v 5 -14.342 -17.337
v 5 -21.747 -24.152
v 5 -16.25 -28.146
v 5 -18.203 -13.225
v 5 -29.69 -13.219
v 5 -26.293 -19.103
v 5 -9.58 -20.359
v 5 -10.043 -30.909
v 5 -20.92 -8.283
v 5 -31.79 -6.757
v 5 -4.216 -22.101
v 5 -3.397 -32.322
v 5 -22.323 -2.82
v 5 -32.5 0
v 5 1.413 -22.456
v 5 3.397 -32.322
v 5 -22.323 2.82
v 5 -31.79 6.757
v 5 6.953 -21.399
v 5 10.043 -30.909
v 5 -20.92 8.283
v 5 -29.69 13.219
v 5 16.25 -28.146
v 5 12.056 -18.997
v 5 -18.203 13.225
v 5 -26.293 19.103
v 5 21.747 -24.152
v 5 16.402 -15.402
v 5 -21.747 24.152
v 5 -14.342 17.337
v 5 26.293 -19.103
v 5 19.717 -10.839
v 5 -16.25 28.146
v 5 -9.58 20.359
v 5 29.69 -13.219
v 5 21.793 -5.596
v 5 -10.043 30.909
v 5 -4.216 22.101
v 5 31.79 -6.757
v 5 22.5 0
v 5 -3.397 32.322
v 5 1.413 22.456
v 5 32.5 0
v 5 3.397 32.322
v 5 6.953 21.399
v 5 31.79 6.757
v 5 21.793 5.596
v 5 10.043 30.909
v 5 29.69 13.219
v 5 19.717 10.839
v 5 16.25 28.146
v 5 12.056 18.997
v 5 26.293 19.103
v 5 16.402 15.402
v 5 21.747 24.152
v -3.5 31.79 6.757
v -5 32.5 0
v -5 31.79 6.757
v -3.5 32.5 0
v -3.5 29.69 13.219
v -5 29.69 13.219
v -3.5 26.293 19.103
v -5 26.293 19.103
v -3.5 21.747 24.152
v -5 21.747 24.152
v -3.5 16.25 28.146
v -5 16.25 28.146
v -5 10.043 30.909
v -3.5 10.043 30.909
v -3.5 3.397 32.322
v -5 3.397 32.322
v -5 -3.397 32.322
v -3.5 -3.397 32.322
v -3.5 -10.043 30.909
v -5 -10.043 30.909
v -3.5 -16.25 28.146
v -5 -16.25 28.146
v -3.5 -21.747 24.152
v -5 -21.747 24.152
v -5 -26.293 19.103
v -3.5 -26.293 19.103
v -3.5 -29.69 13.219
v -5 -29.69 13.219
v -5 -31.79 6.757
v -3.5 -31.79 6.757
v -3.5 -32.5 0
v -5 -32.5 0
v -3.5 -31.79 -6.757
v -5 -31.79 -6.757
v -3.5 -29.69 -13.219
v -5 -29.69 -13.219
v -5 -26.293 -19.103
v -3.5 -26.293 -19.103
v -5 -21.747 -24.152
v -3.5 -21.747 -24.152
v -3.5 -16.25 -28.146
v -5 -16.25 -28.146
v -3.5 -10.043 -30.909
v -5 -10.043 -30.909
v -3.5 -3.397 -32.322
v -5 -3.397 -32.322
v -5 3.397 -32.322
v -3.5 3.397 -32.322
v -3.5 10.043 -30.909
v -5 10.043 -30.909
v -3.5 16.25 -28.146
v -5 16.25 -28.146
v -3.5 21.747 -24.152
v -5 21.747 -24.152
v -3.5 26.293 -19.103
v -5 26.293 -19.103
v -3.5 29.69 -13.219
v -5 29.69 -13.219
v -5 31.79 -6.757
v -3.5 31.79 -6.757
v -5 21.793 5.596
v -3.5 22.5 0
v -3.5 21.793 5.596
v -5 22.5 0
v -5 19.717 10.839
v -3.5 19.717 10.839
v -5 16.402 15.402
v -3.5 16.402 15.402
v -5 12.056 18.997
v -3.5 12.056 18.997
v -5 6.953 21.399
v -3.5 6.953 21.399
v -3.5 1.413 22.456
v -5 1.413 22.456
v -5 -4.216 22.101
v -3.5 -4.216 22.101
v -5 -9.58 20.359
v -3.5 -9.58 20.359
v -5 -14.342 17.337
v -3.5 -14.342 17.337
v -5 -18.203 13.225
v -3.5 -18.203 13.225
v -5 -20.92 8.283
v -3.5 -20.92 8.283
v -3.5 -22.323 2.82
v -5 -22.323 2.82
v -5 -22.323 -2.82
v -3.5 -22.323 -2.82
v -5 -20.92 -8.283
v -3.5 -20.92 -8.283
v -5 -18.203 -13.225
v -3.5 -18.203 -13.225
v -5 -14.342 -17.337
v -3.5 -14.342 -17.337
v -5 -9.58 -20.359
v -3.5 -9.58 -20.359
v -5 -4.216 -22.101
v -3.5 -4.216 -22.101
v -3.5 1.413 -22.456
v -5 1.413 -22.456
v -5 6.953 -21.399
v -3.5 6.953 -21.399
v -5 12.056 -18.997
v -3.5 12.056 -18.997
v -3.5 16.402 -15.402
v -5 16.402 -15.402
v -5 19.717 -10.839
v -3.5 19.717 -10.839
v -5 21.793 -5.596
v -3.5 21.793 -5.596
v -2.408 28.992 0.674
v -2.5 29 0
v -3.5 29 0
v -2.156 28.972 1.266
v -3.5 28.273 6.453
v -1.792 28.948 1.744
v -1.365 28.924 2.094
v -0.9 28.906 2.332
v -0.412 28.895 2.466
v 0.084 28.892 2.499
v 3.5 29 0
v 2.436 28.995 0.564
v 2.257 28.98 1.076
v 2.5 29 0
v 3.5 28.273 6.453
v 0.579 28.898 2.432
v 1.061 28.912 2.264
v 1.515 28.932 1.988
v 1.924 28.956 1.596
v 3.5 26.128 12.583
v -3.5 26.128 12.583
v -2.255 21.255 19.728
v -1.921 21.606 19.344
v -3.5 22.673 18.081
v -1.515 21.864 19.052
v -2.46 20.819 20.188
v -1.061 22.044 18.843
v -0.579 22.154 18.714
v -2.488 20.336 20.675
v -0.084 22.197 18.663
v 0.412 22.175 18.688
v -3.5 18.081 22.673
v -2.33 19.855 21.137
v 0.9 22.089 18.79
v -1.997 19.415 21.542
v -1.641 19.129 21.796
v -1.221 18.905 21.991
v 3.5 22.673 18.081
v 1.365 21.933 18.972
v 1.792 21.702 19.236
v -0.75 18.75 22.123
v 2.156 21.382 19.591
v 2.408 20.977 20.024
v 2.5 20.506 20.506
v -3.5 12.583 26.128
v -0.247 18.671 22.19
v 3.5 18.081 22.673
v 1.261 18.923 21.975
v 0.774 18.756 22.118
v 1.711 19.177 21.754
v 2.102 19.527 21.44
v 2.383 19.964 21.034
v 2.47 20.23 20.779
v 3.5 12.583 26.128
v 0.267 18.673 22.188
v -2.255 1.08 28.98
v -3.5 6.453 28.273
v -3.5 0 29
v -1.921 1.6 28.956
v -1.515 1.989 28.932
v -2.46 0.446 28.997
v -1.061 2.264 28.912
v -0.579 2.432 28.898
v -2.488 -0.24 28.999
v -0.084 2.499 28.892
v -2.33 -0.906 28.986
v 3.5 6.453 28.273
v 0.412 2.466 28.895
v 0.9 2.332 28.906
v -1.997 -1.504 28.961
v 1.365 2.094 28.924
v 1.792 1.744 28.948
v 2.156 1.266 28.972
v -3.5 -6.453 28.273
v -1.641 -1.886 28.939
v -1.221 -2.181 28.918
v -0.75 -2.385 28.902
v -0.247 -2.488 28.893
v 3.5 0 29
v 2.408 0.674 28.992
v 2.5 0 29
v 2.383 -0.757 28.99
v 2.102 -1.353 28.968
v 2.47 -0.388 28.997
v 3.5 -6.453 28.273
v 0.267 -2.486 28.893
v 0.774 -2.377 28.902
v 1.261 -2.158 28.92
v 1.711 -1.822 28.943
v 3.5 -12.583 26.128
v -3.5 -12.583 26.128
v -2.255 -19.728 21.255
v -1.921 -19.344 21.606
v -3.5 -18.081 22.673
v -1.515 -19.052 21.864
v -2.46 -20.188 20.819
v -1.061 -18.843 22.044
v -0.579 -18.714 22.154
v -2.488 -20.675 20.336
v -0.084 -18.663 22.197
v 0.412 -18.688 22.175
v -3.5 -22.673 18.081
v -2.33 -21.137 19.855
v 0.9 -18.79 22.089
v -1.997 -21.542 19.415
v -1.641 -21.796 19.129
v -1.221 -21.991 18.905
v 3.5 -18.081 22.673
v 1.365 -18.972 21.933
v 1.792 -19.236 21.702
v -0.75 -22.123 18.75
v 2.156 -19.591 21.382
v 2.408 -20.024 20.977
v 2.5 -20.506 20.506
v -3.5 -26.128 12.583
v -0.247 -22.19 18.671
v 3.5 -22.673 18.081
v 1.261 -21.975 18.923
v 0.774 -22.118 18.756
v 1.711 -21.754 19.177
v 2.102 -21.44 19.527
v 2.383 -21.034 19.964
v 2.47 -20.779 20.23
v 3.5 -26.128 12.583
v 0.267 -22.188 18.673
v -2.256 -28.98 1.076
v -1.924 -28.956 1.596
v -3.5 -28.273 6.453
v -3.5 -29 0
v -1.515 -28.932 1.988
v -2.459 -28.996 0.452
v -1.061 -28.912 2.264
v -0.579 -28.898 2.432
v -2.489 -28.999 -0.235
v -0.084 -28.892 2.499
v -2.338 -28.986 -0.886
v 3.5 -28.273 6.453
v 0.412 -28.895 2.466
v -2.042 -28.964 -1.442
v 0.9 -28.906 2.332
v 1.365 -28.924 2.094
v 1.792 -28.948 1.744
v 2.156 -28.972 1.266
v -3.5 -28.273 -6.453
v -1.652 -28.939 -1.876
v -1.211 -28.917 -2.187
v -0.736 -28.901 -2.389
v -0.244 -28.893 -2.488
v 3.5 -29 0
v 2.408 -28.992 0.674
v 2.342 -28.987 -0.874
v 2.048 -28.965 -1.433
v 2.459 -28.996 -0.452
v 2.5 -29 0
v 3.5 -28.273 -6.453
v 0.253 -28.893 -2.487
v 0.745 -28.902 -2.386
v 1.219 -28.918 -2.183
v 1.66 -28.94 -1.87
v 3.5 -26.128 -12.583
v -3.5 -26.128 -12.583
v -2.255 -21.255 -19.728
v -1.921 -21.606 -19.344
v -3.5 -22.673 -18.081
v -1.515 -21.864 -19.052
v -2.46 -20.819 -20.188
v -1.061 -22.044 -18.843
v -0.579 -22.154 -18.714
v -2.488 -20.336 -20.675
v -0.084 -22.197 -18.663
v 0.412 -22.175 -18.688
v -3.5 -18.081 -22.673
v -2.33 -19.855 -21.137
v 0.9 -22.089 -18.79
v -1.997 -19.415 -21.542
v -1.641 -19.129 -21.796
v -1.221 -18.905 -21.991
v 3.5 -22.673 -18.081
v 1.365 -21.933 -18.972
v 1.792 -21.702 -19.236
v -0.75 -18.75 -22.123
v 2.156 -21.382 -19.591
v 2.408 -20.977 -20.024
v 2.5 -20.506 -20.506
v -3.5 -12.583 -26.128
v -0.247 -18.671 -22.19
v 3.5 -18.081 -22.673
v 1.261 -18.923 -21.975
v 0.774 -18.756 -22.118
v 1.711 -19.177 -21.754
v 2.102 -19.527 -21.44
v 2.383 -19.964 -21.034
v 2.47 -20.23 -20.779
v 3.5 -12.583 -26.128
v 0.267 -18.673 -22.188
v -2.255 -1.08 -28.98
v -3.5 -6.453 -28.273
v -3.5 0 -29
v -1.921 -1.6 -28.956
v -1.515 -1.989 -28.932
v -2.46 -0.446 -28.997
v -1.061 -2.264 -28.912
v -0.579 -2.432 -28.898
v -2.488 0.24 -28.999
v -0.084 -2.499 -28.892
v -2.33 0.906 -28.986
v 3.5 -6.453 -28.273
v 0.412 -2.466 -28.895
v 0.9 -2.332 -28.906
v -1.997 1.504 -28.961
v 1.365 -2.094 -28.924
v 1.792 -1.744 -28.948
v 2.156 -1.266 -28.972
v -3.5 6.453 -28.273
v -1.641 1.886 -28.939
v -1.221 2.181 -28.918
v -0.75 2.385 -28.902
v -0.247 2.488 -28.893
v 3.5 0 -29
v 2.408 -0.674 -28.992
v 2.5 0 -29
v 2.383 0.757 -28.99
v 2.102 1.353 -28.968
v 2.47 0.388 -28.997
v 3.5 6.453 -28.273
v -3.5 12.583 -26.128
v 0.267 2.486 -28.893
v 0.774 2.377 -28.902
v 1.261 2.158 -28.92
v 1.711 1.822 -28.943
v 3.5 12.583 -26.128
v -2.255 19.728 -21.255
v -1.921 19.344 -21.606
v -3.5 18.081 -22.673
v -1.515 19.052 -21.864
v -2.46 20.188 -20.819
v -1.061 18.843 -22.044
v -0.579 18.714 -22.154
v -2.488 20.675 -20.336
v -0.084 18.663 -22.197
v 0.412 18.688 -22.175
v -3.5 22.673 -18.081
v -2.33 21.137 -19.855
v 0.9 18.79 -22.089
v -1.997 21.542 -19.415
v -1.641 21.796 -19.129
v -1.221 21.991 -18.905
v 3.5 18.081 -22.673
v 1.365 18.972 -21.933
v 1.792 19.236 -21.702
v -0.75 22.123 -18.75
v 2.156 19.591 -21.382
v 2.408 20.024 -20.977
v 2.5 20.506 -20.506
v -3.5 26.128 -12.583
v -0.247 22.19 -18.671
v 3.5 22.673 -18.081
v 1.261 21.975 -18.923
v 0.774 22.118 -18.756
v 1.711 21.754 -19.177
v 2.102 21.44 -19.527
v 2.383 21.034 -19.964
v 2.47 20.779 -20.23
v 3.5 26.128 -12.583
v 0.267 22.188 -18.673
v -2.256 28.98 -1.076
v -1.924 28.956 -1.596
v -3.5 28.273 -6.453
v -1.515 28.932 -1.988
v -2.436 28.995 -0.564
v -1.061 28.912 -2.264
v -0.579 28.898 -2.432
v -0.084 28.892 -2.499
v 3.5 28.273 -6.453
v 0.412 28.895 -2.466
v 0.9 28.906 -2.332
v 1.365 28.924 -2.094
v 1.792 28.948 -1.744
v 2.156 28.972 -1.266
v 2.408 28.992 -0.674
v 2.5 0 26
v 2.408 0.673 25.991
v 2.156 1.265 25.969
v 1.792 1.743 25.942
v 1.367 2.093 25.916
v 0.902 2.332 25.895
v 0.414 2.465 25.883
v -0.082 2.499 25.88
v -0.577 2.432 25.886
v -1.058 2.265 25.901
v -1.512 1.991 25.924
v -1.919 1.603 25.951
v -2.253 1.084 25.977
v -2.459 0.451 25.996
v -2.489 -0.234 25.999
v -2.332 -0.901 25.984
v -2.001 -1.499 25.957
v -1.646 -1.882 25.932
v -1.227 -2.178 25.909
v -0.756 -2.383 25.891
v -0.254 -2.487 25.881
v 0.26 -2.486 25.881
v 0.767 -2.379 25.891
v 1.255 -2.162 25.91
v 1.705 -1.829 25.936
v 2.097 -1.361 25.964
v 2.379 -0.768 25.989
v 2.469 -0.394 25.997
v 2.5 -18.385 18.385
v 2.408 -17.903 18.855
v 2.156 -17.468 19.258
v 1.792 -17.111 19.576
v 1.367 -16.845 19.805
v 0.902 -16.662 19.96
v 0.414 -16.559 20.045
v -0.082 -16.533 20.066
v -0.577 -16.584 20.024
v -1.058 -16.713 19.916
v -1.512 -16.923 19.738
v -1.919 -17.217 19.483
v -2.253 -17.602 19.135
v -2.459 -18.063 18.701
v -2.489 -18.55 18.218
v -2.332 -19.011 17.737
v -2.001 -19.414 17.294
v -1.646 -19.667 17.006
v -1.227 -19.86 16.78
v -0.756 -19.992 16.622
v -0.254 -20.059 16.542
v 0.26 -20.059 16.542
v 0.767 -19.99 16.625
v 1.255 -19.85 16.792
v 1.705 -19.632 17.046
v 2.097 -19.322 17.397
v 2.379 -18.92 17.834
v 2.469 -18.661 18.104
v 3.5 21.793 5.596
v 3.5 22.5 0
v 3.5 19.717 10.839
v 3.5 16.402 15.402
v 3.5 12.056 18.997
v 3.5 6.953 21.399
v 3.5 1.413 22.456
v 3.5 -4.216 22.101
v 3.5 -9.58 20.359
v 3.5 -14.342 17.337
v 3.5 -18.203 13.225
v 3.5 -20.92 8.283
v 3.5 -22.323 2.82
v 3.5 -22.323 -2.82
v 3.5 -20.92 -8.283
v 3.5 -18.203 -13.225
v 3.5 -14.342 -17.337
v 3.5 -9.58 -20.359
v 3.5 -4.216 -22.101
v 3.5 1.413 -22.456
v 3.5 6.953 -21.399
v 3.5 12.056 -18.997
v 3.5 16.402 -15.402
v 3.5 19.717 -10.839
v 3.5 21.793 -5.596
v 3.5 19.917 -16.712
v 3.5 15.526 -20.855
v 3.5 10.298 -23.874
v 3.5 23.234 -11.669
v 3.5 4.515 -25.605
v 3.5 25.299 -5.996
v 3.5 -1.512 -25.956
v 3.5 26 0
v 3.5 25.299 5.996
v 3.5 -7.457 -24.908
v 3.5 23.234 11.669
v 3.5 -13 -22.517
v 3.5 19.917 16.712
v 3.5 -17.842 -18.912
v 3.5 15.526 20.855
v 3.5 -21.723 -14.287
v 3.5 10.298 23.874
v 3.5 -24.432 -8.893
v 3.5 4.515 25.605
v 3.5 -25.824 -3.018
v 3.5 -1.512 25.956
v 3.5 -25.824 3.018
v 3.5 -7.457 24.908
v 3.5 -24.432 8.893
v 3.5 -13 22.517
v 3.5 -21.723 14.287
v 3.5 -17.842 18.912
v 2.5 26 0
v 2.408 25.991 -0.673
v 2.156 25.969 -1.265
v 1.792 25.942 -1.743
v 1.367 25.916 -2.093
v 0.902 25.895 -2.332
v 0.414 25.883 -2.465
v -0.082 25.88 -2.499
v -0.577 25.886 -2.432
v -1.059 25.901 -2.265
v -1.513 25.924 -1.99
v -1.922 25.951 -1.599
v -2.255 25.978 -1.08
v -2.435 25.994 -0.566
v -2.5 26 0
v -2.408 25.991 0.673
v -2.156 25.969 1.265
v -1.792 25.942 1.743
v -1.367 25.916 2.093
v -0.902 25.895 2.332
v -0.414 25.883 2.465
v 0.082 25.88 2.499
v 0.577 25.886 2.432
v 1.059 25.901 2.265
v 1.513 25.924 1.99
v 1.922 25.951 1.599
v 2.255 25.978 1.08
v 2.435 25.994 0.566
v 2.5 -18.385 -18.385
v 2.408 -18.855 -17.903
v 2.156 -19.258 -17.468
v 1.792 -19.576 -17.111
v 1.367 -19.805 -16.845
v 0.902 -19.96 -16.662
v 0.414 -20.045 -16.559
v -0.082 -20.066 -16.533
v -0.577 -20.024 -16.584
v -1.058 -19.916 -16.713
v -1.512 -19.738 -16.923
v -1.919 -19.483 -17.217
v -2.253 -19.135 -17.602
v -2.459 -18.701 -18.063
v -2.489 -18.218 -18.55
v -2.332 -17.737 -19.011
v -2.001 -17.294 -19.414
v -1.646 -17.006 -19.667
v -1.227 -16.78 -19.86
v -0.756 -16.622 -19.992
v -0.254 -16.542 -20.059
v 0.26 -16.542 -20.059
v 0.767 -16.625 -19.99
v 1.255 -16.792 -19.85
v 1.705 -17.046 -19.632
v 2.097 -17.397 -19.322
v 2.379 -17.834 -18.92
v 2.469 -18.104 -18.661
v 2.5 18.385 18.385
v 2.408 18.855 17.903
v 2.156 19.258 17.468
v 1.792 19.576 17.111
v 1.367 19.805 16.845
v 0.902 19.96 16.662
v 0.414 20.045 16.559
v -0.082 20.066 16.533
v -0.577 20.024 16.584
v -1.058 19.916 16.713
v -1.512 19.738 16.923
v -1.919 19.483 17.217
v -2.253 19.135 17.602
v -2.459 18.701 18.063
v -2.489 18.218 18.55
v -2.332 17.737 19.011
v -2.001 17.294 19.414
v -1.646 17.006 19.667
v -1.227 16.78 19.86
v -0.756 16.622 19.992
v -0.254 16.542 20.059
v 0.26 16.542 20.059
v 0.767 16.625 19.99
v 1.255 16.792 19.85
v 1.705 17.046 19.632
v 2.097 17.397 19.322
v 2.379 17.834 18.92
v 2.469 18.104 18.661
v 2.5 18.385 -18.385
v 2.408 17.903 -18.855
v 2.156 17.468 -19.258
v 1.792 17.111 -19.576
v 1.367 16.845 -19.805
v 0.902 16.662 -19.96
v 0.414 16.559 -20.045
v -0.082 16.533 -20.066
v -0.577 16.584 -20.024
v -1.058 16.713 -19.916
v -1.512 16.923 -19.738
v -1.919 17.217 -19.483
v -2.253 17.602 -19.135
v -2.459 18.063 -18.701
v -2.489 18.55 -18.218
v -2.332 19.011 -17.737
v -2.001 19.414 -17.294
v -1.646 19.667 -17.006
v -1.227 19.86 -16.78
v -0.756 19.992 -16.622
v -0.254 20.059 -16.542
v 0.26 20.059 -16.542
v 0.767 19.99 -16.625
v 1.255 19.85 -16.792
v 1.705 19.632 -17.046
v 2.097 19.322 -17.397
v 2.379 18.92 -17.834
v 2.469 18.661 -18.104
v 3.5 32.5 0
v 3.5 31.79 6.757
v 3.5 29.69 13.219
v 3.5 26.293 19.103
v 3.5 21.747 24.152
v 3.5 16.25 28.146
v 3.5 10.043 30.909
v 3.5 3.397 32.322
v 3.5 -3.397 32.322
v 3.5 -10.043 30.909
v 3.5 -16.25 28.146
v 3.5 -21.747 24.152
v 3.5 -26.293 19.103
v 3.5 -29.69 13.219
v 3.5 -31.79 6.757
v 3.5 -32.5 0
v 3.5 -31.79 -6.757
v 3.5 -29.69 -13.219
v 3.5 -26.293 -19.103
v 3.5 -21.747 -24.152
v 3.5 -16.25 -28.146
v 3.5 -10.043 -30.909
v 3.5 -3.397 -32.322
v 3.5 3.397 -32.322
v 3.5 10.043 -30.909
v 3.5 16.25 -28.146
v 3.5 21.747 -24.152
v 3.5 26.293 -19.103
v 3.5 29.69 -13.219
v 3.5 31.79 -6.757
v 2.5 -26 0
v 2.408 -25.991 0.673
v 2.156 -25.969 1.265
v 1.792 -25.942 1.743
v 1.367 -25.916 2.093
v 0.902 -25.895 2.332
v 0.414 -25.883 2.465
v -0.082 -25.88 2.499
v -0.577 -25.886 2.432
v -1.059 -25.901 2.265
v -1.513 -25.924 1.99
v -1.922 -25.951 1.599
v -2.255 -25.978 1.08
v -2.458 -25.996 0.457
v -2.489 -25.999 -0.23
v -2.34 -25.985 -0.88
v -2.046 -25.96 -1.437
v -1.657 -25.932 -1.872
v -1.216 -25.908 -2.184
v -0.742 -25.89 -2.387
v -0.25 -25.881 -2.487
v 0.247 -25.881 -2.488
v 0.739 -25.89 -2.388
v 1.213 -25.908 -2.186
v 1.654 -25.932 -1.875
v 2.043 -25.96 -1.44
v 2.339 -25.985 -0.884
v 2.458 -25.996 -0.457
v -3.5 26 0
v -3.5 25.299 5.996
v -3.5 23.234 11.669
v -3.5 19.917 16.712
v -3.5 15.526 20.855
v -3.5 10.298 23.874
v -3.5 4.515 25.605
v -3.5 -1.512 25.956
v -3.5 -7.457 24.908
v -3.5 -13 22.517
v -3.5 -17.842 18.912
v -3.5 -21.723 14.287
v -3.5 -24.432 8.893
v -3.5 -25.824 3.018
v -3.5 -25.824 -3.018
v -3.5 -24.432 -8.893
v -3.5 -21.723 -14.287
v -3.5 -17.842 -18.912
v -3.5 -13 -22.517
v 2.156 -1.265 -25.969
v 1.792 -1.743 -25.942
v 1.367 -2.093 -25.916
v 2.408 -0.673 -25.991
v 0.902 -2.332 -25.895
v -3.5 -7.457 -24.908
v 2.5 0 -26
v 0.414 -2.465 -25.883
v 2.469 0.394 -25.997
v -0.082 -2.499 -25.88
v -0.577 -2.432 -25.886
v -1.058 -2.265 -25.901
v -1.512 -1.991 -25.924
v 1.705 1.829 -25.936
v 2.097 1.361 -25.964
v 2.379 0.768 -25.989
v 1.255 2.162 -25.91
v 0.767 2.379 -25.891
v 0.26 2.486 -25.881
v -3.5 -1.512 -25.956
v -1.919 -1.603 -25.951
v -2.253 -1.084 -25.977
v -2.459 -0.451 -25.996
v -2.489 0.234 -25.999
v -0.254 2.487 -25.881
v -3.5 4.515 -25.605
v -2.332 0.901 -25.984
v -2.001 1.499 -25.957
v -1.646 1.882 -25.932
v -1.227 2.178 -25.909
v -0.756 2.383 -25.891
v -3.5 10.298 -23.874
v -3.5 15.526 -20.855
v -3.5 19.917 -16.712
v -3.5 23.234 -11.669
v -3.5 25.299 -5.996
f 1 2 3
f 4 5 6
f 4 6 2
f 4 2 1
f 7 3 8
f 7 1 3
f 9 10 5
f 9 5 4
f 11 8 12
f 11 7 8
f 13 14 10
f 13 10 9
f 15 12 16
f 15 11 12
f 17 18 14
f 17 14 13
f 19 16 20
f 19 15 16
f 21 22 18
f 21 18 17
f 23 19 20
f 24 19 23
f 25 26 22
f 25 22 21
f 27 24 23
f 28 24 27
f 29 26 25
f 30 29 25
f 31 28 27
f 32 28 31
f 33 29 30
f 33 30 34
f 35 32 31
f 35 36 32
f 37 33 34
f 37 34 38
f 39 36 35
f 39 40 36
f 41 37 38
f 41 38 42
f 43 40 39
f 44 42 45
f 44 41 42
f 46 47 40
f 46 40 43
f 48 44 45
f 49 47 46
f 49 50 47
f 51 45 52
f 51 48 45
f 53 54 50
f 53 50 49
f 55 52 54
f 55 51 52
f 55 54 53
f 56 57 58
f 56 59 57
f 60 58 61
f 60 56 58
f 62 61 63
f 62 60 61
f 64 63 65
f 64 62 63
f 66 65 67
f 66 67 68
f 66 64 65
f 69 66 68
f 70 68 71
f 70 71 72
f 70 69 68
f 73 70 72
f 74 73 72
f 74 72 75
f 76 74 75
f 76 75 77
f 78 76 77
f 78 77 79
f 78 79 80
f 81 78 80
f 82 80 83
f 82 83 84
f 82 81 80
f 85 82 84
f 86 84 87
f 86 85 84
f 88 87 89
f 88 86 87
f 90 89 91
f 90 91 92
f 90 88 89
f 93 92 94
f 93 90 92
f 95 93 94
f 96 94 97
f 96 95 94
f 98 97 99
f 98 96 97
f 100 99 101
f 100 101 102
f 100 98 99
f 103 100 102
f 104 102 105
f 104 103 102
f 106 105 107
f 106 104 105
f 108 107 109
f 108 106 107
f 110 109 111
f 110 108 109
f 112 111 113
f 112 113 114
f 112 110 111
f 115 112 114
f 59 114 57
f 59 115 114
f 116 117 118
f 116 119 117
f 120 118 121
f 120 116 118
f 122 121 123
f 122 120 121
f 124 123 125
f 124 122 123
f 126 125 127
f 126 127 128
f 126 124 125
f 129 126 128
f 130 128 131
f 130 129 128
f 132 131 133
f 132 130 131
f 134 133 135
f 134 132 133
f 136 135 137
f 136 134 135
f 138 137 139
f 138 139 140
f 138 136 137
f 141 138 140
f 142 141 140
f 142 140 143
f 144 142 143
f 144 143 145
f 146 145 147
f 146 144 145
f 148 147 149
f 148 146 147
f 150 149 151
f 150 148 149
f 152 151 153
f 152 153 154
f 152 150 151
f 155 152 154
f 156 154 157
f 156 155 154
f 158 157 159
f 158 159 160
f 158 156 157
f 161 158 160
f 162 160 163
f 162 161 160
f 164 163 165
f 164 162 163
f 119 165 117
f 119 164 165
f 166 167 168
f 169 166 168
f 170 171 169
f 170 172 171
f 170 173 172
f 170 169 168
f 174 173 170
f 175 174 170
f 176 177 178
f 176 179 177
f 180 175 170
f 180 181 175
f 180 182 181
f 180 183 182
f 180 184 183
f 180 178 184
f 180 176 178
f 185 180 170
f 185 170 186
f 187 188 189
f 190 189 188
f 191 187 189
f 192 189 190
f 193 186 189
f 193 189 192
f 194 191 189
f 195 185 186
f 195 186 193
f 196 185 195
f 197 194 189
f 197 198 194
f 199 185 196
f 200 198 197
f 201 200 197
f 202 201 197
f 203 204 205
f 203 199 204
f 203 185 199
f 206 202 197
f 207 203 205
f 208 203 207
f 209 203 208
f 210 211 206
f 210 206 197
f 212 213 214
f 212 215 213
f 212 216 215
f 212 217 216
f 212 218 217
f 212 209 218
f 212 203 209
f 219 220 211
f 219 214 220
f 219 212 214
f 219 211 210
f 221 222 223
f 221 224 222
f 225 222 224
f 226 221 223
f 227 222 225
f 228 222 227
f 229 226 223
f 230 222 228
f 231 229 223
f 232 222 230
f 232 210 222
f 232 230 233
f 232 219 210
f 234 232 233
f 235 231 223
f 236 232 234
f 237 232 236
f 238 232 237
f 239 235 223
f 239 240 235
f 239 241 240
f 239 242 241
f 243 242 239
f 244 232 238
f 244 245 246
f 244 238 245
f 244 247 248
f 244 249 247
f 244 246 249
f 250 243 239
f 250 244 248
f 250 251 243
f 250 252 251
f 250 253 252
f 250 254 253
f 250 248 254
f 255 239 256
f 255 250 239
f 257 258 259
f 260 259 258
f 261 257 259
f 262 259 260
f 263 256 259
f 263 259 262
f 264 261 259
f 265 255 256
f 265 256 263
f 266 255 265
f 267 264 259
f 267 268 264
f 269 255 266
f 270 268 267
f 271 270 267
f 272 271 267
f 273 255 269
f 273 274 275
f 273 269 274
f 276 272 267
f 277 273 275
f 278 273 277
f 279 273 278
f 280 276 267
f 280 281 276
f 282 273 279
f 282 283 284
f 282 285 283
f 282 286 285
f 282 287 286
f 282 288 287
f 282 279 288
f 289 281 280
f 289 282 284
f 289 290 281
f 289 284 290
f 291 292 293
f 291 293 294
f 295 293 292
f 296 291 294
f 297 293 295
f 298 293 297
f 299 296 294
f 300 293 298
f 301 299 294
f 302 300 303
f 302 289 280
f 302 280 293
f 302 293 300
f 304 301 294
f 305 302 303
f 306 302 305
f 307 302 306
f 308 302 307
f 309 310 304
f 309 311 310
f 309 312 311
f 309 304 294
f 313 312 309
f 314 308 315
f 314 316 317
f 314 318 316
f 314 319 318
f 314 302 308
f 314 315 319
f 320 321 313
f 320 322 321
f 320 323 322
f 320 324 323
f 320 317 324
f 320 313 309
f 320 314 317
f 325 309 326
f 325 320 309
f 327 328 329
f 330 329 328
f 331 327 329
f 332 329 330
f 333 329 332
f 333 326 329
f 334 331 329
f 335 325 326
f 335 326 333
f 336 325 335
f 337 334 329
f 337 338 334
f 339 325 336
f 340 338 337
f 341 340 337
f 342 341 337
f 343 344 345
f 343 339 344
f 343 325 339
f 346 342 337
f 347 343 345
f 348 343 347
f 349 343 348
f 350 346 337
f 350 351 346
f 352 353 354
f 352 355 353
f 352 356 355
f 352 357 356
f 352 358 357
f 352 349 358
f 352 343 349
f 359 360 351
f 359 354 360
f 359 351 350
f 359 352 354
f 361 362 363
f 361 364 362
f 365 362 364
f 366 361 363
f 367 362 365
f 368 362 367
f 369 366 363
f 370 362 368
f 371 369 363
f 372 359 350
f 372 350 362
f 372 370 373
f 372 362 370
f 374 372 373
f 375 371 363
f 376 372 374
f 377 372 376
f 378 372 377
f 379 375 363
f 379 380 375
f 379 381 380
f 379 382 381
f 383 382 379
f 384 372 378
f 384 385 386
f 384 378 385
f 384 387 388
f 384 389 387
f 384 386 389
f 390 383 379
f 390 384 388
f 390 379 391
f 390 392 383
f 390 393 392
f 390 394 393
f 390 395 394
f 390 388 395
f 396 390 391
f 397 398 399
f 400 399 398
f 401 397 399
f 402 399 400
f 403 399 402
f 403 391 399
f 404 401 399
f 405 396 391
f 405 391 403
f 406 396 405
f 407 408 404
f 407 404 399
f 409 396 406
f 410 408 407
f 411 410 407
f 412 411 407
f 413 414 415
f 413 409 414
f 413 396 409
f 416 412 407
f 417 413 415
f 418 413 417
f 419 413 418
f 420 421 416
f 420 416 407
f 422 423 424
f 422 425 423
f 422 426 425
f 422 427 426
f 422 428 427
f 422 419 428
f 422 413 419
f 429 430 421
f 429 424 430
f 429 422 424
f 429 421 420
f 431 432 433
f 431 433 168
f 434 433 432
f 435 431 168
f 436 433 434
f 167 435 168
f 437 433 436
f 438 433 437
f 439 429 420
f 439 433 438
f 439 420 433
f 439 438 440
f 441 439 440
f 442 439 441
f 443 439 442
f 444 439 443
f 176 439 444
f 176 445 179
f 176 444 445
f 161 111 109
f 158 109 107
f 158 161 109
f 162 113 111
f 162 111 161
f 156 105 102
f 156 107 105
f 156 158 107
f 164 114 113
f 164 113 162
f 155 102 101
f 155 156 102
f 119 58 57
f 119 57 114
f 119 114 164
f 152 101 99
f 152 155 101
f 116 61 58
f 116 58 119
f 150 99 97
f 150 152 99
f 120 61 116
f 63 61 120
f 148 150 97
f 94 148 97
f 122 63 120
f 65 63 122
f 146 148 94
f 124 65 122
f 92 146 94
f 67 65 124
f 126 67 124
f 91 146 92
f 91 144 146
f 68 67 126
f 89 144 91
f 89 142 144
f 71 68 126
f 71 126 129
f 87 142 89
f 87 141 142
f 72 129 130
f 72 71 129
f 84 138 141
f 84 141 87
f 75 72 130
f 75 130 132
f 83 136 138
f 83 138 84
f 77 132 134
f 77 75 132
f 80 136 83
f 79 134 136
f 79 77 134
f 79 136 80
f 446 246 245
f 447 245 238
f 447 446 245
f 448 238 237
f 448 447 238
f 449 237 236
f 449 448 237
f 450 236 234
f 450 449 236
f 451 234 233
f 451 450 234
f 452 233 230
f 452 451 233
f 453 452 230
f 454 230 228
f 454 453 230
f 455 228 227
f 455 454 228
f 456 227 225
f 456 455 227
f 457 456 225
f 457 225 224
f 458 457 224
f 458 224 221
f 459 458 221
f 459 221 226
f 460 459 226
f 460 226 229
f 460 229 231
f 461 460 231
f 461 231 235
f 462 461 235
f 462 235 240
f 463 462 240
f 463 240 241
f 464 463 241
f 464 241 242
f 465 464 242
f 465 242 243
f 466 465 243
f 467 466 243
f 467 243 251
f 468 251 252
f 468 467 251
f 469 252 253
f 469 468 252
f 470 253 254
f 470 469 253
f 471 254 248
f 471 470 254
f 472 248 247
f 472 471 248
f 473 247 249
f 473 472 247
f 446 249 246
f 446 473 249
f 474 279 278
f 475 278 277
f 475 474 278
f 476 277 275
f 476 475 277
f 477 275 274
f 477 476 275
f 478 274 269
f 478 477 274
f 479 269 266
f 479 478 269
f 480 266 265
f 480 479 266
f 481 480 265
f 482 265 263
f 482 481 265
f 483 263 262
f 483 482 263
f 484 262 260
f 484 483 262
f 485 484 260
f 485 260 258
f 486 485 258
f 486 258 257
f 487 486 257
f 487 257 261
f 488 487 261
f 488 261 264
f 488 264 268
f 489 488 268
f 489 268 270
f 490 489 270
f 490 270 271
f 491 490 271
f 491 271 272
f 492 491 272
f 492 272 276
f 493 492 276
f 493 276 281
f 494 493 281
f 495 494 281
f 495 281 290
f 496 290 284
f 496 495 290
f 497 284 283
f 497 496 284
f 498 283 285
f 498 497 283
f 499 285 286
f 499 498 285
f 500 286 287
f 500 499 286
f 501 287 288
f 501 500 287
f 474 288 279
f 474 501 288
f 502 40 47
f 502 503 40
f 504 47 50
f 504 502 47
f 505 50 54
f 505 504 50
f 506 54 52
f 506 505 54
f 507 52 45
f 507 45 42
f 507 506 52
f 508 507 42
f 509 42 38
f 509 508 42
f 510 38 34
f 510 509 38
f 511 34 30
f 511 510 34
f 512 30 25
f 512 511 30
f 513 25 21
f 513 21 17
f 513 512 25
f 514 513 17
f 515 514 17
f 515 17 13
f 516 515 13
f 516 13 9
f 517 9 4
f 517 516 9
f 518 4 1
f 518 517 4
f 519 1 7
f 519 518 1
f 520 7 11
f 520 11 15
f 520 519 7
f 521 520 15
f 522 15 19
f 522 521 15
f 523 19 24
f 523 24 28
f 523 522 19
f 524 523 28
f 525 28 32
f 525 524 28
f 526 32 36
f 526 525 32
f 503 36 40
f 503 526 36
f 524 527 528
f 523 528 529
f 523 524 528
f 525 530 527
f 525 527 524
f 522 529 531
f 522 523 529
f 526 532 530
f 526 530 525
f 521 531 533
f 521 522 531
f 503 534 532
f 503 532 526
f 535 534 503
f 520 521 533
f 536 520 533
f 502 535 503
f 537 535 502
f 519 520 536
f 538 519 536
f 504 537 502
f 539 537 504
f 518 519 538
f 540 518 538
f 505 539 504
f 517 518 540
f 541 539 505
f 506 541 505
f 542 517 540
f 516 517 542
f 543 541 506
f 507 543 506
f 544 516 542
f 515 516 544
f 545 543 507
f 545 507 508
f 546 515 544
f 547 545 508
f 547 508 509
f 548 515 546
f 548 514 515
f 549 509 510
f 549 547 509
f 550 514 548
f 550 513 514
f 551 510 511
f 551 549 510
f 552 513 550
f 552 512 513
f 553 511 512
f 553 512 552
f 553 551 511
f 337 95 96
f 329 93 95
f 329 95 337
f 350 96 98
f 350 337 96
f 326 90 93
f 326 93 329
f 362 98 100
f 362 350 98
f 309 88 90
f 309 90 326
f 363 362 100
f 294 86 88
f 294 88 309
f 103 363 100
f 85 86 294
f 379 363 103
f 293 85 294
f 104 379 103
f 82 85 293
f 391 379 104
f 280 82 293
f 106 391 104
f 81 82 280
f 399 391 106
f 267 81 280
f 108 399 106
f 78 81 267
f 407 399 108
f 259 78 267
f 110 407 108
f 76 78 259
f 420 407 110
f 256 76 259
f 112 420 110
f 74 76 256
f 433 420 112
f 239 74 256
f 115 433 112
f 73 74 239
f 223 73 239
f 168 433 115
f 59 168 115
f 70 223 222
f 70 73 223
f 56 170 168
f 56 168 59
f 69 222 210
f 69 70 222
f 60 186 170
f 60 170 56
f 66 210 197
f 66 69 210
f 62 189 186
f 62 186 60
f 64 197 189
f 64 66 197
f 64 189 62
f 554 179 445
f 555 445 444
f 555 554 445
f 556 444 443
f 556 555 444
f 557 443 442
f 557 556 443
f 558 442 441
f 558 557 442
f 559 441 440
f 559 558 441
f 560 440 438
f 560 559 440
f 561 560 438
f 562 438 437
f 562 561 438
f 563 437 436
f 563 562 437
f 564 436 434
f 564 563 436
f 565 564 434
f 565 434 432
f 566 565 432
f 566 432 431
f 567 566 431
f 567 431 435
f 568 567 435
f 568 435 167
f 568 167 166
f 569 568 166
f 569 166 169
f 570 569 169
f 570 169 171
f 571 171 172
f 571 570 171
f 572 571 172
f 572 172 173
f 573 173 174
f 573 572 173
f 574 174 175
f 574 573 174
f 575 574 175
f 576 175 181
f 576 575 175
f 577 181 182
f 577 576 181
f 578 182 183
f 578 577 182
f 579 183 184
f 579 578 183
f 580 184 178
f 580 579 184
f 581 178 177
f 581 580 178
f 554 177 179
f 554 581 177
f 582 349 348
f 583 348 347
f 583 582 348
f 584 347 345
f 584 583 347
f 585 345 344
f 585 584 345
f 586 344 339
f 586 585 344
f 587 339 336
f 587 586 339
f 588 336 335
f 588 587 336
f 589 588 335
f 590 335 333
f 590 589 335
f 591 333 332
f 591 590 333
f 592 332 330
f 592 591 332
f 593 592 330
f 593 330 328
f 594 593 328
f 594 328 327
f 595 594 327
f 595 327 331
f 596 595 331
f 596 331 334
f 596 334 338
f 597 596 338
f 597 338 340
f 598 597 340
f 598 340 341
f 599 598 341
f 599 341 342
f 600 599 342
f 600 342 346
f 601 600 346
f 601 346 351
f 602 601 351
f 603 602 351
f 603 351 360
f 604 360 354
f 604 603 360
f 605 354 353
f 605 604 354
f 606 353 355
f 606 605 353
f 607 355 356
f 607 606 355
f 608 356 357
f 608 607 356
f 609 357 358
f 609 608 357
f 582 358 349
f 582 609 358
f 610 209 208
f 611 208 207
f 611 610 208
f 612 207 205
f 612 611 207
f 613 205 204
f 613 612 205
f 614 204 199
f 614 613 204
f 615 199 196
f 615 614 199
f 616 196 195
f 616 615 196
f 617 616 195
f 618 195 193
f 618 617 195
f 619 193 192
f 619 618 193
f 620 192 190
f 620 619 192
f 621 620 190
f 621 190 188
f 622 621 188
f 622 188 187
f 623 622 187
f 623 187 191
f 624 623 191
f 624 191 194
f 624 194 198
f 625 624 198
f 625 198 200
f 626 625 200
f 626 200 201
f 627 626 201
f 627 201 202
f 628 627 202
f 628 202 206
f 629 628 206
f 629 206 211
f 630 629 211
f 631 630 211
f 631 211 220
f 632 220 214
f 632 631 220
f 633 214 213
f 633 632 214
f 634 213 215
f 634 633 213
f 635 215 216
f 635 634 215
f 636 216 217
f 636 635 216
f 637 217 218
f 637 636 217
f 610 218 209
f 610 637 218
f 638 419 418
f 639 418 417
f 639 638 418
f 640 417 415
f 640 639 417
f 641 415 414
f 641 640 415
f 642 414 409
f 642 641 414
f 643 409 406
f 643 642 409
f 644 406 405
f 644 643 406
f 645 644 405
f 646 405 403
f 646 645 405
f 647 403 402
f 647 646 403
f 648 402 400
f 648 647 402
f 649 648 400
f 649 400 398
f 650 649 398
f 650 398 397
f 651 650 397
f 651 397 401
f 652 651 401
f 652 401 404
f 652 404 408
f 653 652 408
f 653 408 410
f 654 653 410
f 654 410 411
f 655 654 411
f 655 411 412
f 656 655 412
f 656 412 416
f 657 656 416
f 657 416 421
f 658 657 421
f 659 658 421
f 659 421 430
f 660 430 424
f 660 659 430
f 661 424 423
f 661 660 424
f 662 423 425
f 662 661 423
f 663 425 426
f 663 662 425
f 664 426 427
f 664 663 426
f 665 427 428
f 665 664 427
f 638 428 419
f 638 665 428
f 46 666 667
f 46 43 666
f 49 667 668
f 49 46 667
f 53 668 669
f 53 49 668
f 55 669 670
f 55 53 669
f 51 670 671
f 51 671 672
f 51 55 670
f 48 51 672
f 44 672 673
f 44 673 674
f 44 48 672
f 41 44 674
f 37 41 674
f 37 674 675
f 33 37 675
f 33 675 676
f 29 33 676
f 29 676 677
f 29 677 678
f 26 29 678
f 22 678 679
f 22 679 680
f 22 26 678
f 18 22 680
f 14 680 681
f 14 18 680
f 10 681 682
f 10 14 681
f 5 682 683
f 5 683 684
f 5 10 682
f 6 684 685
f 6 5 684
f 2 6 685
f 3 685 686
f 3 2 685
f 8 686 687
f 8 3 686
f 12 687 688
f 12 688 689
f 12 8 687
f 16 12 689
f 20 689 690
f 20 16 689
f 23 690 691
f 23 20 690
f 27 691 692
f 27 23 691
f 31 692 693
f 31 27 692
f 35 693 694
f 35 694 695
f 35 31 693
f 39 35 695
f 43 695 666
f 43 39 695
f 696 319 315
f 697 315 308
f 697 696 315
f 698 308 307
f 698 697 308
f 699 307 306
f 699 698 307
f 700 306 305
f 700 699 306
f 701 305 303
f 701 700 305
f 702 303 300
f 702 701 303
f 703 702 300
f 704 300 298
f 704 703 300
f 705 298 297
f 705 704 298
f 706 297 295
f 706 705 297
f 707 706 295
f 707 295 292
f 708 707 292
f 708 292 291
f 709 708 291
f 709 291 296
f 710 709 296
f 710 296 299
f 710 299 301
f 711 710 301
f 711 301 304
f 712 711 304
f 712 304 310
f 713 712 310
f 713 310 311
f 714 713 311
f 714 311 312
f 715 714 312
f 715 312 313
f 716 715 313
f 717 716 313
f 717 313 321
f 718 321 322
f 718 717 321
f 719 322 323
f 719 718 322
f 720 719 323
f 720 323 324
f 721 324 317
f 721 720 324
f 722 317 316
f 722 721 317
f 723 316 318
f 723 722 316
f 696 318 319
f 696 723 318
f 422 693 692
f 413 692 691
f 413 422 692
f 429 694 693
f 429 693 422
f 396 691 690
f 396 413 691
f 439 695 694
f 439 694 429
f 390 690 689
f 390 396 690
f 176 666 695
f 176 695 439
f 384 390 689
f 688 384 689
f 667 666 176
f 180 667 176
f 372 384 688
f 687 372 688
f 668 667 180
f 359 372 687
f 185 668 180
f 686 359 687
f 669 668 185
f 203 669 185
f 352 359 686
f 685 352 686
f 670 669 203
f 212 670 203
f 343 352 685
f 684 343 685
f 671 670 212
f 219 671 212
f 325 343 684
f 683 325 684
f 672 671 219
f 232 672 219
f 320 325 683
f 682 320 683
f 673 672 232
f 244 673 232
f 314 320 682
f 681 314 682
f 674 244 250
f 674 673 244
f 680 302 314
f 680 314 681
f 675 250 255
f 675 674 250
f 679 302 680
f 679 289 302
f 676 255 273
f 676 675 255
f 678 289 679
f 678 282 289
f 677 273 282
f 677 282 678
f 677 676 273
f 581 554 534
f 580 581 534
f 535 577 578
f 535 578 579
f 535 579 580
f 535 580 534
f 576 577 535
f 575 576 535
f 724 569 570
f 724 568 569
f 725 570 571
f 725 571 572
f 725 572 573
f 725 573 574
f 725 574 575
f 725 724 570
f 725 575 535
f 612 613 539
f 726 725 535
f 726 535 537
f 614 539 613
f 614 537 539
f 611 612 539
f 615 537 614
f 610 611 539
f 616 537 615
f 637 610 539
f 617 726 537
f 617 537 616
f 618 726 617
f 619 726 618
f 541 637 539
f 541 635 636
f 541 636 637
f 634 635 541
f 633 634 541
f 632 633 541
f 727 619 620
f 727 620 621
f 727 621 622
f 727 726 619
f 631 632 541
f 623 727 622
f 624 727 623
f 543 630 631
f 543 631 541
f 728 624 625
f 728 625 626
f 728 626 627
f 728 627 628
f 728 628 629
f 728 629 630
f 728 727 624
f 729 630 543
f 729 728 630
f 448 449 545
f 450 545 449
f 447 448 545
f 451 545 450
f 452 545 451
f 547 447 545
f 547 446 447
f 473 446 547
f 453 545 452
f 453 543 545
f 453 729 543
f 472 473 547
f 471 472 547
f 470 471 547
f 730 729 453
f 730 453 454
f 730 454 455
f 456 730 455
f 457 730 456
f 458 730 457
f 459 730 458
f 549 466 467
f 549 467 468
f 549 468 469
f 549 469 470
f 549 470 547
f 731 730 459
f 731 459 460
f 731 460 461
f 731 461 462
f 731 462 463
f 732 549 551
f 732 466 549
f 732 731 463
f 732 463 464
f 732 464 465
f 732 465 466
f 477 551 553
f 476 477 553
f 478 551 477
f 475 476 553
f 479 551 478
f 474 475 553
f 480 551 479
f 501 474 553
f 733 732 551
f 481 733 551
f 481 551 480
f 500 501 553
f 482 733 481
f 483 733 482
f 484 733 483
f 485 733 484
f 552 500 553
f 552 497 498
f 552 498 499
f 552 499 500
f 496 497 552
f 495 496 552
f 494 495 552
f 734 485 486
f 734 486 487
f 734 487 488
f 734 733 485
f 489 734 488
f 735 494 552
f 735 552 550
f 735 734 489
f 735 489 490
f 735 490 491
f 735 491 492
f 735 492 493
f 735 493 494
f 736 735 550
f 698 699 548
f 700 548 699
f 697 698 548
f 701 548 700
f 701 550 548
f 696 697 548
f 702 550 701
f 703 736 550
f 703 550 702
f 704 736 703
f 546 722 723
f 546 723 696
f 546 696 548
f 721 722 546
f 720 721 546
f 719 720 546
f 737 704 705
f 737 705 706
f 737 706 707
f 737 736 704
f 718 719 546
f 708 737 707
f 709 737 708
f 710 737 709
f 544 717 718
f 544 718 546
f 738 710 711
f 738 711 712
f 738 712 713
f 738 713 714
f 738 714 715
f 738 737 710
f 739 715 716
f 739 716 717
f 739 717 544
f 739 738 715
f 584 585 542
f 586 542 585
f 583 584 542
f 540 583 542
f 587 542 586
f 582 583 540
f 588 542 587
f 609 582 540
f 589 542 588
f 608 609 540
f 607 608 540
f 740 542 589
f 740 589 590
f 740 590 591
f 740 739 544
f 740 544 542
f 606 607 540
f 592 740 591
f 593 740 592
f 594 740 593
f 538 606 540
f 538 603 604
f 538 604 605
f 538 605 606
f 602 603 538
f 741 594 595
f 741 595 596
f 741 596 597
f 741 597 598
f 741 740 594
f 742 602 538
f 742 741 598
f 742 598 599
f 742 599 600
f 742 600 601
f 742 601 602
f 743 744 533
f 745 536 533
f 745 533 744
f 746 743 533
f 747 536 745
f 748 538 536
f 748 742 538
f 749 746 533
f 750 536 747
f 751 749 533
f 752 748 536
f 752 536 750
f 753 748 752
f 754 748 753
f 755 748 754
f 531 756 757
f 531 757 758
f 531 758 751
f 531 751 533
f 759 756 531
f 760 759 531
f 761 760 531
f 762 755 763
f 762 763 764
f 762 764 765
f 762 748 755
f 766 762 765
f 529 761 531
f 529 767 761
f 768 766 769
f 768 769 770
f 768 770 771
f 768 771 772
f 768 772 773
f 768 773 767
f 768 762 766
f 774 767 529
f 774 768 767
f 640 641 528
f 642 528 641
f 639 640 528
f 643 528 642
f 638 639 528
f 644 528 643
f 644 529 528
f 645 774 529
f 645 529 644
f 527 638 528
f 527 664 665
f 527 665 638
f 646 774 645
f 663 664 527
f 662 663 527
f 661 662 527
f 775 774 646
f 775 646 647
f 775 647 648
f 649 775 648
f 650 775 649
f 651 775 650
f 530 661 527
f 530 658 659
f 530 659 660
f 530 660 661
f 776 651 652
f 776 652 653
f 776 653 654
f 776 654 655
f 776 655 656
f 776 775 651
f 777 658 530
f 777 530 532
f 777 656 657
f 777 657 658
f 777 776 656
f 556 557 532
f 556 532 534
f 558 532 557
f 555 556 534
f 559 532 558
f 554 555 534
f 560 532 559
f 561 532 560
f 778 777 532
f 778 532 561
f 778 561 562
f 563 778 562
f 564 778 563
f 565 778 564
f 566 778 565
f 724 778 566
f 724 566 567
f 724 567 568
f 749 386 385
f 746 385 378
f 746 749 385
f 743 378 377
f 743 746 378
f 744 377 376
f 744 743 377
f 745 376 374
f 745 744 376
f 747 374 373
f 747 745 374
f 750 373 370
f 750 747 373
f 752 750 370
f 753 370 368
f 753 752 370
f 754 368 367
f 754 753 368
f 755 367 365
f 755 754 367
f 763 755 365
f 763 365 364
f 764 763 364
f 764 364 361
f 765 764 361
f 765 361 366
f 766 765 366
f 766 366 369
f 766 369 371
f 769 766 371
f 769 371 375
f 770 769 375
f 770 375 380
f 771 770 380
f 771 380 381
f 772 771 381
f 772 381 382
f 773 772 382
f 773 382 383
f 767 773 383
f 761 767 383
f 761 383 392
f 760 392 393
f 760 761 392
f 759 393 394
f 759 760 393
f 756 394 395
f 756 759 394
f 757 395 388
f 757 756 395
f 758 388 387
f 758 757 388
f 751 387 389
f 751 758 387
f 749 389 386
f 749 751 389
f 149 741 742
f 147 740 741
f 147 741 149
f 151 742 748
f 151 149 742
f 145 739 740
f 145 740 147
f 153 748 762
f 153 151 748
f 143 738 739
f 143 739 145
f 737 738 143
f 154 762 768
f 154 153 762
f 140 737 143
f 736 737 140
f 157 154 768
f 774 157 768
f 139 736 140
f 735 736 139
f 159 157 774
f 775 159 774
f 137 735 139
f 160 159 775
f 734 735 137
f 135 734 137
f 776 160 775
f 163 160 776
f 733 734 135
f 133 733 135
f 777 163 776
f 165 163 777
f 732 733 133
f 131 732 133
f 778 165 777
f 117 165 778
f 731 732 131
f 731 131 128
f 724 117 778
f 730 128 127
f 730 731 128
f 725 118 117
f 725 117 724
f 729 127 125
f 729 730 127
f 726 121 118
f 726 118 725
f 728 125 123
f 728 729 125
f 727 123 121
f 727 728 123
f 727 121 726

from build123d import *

# Parameters (mm, degrees)
SKETCH2_R          = 2.5
CUT_EXTRUDE1_DEPTH = 33.5
CIRPATTERN1_COUNT  = 8


with BuildPart() as part:
    # Sketch1 → Revolve1 (revolve)
    with BuildSketch(Plane.XY):
        Polygon((-3.5, 29), (3.5, 29), (3.5, 32.5), (5, 32.5), (5, 22.5), (3.5, 22.5), (3.5, 26), (-3.5, 26), (-3.5, 22.5), (-5, 22.5), (-5, 32.5), (-3.5, 32.5), align=None)
    revolve(axis=Axis((-5.608551002, 0, 0), (1, 0, 0)))

    # Sketch2 → Cut-Extrude1 (cut, through all)
    with BuildSketch(Plane(origin=(0, 0, 0), x_dir=(1, 0, 0), z_dir=(0, 1, 0))):
        Circle(SKETCH2_R)
    cut_extrude1 = extrude(amount=CUT_EXTRUDE1_DEPTH, mode=Mode.SUBTRACT)

    # CirPattern1: Cut-Extrude1 ×8 about axis
    cirpattern1_axis = Axis((-5.608551002, 0, 0), (-1, 0, 0))
    for i in range(1, CIRPATTERN1_COUNT):
        add(cut_extrude1.rotate(cirpattern1_axis, i * 360 / CIRPATTERN1_COUNT), mode=Mode.SUBTRACT)


solid = part.part
